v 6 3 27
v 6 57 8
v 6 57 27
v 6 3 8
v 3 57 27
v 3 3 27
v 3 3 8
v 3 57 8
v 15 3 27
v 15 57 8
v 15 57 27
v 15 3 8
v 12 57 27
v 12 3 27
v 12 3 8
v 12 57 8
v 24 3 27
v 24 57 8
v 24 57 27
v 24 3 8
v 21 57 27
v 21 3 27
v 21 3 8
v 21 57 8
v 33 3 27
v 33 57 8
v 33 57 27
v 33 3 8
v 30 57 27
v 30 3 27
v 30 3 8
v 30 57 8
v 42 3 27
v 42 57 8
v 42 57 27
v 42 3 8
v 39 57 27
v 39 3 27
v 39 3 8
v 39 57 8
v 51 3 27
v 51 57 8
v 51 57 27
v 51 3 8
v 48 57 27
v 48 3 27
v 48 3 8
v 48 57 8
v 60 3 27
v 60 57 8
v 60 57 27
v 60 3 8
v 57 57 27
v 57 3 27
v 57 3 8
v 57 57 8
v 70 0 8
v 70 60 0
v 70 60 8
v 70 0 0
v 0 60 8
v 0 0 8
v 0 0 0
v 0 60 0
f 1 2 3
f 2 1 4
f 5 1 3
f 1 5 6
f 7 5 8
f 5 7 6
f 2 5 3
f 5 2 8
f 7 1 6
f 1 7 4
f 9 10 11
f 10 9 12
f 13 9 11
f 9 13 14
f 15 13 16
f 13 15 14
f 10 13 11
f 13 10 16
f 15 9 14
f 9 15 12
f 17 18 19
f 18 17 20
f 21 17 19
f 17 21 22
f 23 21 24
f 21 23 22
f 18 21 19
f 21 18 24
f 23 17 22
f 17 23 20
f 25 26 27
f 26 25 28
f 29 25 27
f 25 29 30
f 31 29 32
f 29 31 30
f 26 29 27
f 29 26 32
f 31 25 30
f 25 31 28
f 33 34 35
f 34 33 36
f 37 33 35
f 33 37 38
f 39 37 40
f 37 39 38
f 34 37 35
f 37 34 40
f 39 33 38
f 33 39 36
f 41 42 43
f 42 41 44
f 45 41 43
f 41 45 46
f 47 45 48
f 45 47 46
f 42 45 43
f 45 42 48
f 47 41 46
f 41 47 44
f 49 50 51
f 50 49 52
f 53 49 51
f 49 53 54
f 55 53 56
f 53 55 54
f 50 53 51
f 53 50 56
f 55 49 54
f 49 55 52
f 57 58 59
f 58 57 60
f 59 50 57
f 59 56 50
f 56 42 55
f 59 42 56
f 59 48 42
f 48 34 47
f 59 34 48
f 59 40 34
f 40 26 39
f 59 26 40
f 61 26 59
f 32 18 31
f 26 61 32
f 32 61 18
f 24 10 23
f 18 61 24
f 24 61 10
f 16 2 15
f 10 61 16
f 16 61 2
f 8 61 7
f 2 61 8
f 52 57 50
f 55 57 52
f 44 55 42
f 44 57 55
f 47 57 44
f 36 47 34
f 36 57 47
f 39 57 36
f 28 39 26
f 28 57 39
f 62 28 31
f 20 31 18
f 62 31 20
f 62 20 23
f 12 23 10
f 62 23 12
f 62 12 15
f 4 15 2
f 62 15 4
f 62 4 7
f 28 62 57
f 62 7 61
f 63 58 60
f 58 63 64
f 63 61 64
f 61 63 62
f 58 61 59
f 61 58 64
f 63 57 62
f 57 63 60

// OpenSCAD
$fn = 32;

// ----------------------------------------------------------------------
// Heatsink: uniform fin block
// ----------------------------------------------------------------------

// --- parameters (mm) ---
base_l = 70;              // base length, X
base_w = 60;              // base width, Y
base_t = 8;               // base plate thickness
fin_h = 20;               // fin height above the base
fin_t = 3;                // fin thickness
edge = 3;                 // margin from the base ends
pitch = 9;                // fin pitch
fit_tol = 0.05;           // tolerance for press fits, mm
free_tol = 0.2;           // tolerance for clearance fits, mm

n_fins = floor((base_l - 2 * edge - fin_t) / pitch) + 1;  // fin count
total_h = base_t + fin_h - 1;  // overall height

union() {
  cube([base_l, base_w, base_t]);
  for (i = [0 : n_fins - 1])
    translate([edge + i * pitch, edge, base_t - 1])
      cube([fin_t, base_w - 2 * edge, fin_h]);
}
